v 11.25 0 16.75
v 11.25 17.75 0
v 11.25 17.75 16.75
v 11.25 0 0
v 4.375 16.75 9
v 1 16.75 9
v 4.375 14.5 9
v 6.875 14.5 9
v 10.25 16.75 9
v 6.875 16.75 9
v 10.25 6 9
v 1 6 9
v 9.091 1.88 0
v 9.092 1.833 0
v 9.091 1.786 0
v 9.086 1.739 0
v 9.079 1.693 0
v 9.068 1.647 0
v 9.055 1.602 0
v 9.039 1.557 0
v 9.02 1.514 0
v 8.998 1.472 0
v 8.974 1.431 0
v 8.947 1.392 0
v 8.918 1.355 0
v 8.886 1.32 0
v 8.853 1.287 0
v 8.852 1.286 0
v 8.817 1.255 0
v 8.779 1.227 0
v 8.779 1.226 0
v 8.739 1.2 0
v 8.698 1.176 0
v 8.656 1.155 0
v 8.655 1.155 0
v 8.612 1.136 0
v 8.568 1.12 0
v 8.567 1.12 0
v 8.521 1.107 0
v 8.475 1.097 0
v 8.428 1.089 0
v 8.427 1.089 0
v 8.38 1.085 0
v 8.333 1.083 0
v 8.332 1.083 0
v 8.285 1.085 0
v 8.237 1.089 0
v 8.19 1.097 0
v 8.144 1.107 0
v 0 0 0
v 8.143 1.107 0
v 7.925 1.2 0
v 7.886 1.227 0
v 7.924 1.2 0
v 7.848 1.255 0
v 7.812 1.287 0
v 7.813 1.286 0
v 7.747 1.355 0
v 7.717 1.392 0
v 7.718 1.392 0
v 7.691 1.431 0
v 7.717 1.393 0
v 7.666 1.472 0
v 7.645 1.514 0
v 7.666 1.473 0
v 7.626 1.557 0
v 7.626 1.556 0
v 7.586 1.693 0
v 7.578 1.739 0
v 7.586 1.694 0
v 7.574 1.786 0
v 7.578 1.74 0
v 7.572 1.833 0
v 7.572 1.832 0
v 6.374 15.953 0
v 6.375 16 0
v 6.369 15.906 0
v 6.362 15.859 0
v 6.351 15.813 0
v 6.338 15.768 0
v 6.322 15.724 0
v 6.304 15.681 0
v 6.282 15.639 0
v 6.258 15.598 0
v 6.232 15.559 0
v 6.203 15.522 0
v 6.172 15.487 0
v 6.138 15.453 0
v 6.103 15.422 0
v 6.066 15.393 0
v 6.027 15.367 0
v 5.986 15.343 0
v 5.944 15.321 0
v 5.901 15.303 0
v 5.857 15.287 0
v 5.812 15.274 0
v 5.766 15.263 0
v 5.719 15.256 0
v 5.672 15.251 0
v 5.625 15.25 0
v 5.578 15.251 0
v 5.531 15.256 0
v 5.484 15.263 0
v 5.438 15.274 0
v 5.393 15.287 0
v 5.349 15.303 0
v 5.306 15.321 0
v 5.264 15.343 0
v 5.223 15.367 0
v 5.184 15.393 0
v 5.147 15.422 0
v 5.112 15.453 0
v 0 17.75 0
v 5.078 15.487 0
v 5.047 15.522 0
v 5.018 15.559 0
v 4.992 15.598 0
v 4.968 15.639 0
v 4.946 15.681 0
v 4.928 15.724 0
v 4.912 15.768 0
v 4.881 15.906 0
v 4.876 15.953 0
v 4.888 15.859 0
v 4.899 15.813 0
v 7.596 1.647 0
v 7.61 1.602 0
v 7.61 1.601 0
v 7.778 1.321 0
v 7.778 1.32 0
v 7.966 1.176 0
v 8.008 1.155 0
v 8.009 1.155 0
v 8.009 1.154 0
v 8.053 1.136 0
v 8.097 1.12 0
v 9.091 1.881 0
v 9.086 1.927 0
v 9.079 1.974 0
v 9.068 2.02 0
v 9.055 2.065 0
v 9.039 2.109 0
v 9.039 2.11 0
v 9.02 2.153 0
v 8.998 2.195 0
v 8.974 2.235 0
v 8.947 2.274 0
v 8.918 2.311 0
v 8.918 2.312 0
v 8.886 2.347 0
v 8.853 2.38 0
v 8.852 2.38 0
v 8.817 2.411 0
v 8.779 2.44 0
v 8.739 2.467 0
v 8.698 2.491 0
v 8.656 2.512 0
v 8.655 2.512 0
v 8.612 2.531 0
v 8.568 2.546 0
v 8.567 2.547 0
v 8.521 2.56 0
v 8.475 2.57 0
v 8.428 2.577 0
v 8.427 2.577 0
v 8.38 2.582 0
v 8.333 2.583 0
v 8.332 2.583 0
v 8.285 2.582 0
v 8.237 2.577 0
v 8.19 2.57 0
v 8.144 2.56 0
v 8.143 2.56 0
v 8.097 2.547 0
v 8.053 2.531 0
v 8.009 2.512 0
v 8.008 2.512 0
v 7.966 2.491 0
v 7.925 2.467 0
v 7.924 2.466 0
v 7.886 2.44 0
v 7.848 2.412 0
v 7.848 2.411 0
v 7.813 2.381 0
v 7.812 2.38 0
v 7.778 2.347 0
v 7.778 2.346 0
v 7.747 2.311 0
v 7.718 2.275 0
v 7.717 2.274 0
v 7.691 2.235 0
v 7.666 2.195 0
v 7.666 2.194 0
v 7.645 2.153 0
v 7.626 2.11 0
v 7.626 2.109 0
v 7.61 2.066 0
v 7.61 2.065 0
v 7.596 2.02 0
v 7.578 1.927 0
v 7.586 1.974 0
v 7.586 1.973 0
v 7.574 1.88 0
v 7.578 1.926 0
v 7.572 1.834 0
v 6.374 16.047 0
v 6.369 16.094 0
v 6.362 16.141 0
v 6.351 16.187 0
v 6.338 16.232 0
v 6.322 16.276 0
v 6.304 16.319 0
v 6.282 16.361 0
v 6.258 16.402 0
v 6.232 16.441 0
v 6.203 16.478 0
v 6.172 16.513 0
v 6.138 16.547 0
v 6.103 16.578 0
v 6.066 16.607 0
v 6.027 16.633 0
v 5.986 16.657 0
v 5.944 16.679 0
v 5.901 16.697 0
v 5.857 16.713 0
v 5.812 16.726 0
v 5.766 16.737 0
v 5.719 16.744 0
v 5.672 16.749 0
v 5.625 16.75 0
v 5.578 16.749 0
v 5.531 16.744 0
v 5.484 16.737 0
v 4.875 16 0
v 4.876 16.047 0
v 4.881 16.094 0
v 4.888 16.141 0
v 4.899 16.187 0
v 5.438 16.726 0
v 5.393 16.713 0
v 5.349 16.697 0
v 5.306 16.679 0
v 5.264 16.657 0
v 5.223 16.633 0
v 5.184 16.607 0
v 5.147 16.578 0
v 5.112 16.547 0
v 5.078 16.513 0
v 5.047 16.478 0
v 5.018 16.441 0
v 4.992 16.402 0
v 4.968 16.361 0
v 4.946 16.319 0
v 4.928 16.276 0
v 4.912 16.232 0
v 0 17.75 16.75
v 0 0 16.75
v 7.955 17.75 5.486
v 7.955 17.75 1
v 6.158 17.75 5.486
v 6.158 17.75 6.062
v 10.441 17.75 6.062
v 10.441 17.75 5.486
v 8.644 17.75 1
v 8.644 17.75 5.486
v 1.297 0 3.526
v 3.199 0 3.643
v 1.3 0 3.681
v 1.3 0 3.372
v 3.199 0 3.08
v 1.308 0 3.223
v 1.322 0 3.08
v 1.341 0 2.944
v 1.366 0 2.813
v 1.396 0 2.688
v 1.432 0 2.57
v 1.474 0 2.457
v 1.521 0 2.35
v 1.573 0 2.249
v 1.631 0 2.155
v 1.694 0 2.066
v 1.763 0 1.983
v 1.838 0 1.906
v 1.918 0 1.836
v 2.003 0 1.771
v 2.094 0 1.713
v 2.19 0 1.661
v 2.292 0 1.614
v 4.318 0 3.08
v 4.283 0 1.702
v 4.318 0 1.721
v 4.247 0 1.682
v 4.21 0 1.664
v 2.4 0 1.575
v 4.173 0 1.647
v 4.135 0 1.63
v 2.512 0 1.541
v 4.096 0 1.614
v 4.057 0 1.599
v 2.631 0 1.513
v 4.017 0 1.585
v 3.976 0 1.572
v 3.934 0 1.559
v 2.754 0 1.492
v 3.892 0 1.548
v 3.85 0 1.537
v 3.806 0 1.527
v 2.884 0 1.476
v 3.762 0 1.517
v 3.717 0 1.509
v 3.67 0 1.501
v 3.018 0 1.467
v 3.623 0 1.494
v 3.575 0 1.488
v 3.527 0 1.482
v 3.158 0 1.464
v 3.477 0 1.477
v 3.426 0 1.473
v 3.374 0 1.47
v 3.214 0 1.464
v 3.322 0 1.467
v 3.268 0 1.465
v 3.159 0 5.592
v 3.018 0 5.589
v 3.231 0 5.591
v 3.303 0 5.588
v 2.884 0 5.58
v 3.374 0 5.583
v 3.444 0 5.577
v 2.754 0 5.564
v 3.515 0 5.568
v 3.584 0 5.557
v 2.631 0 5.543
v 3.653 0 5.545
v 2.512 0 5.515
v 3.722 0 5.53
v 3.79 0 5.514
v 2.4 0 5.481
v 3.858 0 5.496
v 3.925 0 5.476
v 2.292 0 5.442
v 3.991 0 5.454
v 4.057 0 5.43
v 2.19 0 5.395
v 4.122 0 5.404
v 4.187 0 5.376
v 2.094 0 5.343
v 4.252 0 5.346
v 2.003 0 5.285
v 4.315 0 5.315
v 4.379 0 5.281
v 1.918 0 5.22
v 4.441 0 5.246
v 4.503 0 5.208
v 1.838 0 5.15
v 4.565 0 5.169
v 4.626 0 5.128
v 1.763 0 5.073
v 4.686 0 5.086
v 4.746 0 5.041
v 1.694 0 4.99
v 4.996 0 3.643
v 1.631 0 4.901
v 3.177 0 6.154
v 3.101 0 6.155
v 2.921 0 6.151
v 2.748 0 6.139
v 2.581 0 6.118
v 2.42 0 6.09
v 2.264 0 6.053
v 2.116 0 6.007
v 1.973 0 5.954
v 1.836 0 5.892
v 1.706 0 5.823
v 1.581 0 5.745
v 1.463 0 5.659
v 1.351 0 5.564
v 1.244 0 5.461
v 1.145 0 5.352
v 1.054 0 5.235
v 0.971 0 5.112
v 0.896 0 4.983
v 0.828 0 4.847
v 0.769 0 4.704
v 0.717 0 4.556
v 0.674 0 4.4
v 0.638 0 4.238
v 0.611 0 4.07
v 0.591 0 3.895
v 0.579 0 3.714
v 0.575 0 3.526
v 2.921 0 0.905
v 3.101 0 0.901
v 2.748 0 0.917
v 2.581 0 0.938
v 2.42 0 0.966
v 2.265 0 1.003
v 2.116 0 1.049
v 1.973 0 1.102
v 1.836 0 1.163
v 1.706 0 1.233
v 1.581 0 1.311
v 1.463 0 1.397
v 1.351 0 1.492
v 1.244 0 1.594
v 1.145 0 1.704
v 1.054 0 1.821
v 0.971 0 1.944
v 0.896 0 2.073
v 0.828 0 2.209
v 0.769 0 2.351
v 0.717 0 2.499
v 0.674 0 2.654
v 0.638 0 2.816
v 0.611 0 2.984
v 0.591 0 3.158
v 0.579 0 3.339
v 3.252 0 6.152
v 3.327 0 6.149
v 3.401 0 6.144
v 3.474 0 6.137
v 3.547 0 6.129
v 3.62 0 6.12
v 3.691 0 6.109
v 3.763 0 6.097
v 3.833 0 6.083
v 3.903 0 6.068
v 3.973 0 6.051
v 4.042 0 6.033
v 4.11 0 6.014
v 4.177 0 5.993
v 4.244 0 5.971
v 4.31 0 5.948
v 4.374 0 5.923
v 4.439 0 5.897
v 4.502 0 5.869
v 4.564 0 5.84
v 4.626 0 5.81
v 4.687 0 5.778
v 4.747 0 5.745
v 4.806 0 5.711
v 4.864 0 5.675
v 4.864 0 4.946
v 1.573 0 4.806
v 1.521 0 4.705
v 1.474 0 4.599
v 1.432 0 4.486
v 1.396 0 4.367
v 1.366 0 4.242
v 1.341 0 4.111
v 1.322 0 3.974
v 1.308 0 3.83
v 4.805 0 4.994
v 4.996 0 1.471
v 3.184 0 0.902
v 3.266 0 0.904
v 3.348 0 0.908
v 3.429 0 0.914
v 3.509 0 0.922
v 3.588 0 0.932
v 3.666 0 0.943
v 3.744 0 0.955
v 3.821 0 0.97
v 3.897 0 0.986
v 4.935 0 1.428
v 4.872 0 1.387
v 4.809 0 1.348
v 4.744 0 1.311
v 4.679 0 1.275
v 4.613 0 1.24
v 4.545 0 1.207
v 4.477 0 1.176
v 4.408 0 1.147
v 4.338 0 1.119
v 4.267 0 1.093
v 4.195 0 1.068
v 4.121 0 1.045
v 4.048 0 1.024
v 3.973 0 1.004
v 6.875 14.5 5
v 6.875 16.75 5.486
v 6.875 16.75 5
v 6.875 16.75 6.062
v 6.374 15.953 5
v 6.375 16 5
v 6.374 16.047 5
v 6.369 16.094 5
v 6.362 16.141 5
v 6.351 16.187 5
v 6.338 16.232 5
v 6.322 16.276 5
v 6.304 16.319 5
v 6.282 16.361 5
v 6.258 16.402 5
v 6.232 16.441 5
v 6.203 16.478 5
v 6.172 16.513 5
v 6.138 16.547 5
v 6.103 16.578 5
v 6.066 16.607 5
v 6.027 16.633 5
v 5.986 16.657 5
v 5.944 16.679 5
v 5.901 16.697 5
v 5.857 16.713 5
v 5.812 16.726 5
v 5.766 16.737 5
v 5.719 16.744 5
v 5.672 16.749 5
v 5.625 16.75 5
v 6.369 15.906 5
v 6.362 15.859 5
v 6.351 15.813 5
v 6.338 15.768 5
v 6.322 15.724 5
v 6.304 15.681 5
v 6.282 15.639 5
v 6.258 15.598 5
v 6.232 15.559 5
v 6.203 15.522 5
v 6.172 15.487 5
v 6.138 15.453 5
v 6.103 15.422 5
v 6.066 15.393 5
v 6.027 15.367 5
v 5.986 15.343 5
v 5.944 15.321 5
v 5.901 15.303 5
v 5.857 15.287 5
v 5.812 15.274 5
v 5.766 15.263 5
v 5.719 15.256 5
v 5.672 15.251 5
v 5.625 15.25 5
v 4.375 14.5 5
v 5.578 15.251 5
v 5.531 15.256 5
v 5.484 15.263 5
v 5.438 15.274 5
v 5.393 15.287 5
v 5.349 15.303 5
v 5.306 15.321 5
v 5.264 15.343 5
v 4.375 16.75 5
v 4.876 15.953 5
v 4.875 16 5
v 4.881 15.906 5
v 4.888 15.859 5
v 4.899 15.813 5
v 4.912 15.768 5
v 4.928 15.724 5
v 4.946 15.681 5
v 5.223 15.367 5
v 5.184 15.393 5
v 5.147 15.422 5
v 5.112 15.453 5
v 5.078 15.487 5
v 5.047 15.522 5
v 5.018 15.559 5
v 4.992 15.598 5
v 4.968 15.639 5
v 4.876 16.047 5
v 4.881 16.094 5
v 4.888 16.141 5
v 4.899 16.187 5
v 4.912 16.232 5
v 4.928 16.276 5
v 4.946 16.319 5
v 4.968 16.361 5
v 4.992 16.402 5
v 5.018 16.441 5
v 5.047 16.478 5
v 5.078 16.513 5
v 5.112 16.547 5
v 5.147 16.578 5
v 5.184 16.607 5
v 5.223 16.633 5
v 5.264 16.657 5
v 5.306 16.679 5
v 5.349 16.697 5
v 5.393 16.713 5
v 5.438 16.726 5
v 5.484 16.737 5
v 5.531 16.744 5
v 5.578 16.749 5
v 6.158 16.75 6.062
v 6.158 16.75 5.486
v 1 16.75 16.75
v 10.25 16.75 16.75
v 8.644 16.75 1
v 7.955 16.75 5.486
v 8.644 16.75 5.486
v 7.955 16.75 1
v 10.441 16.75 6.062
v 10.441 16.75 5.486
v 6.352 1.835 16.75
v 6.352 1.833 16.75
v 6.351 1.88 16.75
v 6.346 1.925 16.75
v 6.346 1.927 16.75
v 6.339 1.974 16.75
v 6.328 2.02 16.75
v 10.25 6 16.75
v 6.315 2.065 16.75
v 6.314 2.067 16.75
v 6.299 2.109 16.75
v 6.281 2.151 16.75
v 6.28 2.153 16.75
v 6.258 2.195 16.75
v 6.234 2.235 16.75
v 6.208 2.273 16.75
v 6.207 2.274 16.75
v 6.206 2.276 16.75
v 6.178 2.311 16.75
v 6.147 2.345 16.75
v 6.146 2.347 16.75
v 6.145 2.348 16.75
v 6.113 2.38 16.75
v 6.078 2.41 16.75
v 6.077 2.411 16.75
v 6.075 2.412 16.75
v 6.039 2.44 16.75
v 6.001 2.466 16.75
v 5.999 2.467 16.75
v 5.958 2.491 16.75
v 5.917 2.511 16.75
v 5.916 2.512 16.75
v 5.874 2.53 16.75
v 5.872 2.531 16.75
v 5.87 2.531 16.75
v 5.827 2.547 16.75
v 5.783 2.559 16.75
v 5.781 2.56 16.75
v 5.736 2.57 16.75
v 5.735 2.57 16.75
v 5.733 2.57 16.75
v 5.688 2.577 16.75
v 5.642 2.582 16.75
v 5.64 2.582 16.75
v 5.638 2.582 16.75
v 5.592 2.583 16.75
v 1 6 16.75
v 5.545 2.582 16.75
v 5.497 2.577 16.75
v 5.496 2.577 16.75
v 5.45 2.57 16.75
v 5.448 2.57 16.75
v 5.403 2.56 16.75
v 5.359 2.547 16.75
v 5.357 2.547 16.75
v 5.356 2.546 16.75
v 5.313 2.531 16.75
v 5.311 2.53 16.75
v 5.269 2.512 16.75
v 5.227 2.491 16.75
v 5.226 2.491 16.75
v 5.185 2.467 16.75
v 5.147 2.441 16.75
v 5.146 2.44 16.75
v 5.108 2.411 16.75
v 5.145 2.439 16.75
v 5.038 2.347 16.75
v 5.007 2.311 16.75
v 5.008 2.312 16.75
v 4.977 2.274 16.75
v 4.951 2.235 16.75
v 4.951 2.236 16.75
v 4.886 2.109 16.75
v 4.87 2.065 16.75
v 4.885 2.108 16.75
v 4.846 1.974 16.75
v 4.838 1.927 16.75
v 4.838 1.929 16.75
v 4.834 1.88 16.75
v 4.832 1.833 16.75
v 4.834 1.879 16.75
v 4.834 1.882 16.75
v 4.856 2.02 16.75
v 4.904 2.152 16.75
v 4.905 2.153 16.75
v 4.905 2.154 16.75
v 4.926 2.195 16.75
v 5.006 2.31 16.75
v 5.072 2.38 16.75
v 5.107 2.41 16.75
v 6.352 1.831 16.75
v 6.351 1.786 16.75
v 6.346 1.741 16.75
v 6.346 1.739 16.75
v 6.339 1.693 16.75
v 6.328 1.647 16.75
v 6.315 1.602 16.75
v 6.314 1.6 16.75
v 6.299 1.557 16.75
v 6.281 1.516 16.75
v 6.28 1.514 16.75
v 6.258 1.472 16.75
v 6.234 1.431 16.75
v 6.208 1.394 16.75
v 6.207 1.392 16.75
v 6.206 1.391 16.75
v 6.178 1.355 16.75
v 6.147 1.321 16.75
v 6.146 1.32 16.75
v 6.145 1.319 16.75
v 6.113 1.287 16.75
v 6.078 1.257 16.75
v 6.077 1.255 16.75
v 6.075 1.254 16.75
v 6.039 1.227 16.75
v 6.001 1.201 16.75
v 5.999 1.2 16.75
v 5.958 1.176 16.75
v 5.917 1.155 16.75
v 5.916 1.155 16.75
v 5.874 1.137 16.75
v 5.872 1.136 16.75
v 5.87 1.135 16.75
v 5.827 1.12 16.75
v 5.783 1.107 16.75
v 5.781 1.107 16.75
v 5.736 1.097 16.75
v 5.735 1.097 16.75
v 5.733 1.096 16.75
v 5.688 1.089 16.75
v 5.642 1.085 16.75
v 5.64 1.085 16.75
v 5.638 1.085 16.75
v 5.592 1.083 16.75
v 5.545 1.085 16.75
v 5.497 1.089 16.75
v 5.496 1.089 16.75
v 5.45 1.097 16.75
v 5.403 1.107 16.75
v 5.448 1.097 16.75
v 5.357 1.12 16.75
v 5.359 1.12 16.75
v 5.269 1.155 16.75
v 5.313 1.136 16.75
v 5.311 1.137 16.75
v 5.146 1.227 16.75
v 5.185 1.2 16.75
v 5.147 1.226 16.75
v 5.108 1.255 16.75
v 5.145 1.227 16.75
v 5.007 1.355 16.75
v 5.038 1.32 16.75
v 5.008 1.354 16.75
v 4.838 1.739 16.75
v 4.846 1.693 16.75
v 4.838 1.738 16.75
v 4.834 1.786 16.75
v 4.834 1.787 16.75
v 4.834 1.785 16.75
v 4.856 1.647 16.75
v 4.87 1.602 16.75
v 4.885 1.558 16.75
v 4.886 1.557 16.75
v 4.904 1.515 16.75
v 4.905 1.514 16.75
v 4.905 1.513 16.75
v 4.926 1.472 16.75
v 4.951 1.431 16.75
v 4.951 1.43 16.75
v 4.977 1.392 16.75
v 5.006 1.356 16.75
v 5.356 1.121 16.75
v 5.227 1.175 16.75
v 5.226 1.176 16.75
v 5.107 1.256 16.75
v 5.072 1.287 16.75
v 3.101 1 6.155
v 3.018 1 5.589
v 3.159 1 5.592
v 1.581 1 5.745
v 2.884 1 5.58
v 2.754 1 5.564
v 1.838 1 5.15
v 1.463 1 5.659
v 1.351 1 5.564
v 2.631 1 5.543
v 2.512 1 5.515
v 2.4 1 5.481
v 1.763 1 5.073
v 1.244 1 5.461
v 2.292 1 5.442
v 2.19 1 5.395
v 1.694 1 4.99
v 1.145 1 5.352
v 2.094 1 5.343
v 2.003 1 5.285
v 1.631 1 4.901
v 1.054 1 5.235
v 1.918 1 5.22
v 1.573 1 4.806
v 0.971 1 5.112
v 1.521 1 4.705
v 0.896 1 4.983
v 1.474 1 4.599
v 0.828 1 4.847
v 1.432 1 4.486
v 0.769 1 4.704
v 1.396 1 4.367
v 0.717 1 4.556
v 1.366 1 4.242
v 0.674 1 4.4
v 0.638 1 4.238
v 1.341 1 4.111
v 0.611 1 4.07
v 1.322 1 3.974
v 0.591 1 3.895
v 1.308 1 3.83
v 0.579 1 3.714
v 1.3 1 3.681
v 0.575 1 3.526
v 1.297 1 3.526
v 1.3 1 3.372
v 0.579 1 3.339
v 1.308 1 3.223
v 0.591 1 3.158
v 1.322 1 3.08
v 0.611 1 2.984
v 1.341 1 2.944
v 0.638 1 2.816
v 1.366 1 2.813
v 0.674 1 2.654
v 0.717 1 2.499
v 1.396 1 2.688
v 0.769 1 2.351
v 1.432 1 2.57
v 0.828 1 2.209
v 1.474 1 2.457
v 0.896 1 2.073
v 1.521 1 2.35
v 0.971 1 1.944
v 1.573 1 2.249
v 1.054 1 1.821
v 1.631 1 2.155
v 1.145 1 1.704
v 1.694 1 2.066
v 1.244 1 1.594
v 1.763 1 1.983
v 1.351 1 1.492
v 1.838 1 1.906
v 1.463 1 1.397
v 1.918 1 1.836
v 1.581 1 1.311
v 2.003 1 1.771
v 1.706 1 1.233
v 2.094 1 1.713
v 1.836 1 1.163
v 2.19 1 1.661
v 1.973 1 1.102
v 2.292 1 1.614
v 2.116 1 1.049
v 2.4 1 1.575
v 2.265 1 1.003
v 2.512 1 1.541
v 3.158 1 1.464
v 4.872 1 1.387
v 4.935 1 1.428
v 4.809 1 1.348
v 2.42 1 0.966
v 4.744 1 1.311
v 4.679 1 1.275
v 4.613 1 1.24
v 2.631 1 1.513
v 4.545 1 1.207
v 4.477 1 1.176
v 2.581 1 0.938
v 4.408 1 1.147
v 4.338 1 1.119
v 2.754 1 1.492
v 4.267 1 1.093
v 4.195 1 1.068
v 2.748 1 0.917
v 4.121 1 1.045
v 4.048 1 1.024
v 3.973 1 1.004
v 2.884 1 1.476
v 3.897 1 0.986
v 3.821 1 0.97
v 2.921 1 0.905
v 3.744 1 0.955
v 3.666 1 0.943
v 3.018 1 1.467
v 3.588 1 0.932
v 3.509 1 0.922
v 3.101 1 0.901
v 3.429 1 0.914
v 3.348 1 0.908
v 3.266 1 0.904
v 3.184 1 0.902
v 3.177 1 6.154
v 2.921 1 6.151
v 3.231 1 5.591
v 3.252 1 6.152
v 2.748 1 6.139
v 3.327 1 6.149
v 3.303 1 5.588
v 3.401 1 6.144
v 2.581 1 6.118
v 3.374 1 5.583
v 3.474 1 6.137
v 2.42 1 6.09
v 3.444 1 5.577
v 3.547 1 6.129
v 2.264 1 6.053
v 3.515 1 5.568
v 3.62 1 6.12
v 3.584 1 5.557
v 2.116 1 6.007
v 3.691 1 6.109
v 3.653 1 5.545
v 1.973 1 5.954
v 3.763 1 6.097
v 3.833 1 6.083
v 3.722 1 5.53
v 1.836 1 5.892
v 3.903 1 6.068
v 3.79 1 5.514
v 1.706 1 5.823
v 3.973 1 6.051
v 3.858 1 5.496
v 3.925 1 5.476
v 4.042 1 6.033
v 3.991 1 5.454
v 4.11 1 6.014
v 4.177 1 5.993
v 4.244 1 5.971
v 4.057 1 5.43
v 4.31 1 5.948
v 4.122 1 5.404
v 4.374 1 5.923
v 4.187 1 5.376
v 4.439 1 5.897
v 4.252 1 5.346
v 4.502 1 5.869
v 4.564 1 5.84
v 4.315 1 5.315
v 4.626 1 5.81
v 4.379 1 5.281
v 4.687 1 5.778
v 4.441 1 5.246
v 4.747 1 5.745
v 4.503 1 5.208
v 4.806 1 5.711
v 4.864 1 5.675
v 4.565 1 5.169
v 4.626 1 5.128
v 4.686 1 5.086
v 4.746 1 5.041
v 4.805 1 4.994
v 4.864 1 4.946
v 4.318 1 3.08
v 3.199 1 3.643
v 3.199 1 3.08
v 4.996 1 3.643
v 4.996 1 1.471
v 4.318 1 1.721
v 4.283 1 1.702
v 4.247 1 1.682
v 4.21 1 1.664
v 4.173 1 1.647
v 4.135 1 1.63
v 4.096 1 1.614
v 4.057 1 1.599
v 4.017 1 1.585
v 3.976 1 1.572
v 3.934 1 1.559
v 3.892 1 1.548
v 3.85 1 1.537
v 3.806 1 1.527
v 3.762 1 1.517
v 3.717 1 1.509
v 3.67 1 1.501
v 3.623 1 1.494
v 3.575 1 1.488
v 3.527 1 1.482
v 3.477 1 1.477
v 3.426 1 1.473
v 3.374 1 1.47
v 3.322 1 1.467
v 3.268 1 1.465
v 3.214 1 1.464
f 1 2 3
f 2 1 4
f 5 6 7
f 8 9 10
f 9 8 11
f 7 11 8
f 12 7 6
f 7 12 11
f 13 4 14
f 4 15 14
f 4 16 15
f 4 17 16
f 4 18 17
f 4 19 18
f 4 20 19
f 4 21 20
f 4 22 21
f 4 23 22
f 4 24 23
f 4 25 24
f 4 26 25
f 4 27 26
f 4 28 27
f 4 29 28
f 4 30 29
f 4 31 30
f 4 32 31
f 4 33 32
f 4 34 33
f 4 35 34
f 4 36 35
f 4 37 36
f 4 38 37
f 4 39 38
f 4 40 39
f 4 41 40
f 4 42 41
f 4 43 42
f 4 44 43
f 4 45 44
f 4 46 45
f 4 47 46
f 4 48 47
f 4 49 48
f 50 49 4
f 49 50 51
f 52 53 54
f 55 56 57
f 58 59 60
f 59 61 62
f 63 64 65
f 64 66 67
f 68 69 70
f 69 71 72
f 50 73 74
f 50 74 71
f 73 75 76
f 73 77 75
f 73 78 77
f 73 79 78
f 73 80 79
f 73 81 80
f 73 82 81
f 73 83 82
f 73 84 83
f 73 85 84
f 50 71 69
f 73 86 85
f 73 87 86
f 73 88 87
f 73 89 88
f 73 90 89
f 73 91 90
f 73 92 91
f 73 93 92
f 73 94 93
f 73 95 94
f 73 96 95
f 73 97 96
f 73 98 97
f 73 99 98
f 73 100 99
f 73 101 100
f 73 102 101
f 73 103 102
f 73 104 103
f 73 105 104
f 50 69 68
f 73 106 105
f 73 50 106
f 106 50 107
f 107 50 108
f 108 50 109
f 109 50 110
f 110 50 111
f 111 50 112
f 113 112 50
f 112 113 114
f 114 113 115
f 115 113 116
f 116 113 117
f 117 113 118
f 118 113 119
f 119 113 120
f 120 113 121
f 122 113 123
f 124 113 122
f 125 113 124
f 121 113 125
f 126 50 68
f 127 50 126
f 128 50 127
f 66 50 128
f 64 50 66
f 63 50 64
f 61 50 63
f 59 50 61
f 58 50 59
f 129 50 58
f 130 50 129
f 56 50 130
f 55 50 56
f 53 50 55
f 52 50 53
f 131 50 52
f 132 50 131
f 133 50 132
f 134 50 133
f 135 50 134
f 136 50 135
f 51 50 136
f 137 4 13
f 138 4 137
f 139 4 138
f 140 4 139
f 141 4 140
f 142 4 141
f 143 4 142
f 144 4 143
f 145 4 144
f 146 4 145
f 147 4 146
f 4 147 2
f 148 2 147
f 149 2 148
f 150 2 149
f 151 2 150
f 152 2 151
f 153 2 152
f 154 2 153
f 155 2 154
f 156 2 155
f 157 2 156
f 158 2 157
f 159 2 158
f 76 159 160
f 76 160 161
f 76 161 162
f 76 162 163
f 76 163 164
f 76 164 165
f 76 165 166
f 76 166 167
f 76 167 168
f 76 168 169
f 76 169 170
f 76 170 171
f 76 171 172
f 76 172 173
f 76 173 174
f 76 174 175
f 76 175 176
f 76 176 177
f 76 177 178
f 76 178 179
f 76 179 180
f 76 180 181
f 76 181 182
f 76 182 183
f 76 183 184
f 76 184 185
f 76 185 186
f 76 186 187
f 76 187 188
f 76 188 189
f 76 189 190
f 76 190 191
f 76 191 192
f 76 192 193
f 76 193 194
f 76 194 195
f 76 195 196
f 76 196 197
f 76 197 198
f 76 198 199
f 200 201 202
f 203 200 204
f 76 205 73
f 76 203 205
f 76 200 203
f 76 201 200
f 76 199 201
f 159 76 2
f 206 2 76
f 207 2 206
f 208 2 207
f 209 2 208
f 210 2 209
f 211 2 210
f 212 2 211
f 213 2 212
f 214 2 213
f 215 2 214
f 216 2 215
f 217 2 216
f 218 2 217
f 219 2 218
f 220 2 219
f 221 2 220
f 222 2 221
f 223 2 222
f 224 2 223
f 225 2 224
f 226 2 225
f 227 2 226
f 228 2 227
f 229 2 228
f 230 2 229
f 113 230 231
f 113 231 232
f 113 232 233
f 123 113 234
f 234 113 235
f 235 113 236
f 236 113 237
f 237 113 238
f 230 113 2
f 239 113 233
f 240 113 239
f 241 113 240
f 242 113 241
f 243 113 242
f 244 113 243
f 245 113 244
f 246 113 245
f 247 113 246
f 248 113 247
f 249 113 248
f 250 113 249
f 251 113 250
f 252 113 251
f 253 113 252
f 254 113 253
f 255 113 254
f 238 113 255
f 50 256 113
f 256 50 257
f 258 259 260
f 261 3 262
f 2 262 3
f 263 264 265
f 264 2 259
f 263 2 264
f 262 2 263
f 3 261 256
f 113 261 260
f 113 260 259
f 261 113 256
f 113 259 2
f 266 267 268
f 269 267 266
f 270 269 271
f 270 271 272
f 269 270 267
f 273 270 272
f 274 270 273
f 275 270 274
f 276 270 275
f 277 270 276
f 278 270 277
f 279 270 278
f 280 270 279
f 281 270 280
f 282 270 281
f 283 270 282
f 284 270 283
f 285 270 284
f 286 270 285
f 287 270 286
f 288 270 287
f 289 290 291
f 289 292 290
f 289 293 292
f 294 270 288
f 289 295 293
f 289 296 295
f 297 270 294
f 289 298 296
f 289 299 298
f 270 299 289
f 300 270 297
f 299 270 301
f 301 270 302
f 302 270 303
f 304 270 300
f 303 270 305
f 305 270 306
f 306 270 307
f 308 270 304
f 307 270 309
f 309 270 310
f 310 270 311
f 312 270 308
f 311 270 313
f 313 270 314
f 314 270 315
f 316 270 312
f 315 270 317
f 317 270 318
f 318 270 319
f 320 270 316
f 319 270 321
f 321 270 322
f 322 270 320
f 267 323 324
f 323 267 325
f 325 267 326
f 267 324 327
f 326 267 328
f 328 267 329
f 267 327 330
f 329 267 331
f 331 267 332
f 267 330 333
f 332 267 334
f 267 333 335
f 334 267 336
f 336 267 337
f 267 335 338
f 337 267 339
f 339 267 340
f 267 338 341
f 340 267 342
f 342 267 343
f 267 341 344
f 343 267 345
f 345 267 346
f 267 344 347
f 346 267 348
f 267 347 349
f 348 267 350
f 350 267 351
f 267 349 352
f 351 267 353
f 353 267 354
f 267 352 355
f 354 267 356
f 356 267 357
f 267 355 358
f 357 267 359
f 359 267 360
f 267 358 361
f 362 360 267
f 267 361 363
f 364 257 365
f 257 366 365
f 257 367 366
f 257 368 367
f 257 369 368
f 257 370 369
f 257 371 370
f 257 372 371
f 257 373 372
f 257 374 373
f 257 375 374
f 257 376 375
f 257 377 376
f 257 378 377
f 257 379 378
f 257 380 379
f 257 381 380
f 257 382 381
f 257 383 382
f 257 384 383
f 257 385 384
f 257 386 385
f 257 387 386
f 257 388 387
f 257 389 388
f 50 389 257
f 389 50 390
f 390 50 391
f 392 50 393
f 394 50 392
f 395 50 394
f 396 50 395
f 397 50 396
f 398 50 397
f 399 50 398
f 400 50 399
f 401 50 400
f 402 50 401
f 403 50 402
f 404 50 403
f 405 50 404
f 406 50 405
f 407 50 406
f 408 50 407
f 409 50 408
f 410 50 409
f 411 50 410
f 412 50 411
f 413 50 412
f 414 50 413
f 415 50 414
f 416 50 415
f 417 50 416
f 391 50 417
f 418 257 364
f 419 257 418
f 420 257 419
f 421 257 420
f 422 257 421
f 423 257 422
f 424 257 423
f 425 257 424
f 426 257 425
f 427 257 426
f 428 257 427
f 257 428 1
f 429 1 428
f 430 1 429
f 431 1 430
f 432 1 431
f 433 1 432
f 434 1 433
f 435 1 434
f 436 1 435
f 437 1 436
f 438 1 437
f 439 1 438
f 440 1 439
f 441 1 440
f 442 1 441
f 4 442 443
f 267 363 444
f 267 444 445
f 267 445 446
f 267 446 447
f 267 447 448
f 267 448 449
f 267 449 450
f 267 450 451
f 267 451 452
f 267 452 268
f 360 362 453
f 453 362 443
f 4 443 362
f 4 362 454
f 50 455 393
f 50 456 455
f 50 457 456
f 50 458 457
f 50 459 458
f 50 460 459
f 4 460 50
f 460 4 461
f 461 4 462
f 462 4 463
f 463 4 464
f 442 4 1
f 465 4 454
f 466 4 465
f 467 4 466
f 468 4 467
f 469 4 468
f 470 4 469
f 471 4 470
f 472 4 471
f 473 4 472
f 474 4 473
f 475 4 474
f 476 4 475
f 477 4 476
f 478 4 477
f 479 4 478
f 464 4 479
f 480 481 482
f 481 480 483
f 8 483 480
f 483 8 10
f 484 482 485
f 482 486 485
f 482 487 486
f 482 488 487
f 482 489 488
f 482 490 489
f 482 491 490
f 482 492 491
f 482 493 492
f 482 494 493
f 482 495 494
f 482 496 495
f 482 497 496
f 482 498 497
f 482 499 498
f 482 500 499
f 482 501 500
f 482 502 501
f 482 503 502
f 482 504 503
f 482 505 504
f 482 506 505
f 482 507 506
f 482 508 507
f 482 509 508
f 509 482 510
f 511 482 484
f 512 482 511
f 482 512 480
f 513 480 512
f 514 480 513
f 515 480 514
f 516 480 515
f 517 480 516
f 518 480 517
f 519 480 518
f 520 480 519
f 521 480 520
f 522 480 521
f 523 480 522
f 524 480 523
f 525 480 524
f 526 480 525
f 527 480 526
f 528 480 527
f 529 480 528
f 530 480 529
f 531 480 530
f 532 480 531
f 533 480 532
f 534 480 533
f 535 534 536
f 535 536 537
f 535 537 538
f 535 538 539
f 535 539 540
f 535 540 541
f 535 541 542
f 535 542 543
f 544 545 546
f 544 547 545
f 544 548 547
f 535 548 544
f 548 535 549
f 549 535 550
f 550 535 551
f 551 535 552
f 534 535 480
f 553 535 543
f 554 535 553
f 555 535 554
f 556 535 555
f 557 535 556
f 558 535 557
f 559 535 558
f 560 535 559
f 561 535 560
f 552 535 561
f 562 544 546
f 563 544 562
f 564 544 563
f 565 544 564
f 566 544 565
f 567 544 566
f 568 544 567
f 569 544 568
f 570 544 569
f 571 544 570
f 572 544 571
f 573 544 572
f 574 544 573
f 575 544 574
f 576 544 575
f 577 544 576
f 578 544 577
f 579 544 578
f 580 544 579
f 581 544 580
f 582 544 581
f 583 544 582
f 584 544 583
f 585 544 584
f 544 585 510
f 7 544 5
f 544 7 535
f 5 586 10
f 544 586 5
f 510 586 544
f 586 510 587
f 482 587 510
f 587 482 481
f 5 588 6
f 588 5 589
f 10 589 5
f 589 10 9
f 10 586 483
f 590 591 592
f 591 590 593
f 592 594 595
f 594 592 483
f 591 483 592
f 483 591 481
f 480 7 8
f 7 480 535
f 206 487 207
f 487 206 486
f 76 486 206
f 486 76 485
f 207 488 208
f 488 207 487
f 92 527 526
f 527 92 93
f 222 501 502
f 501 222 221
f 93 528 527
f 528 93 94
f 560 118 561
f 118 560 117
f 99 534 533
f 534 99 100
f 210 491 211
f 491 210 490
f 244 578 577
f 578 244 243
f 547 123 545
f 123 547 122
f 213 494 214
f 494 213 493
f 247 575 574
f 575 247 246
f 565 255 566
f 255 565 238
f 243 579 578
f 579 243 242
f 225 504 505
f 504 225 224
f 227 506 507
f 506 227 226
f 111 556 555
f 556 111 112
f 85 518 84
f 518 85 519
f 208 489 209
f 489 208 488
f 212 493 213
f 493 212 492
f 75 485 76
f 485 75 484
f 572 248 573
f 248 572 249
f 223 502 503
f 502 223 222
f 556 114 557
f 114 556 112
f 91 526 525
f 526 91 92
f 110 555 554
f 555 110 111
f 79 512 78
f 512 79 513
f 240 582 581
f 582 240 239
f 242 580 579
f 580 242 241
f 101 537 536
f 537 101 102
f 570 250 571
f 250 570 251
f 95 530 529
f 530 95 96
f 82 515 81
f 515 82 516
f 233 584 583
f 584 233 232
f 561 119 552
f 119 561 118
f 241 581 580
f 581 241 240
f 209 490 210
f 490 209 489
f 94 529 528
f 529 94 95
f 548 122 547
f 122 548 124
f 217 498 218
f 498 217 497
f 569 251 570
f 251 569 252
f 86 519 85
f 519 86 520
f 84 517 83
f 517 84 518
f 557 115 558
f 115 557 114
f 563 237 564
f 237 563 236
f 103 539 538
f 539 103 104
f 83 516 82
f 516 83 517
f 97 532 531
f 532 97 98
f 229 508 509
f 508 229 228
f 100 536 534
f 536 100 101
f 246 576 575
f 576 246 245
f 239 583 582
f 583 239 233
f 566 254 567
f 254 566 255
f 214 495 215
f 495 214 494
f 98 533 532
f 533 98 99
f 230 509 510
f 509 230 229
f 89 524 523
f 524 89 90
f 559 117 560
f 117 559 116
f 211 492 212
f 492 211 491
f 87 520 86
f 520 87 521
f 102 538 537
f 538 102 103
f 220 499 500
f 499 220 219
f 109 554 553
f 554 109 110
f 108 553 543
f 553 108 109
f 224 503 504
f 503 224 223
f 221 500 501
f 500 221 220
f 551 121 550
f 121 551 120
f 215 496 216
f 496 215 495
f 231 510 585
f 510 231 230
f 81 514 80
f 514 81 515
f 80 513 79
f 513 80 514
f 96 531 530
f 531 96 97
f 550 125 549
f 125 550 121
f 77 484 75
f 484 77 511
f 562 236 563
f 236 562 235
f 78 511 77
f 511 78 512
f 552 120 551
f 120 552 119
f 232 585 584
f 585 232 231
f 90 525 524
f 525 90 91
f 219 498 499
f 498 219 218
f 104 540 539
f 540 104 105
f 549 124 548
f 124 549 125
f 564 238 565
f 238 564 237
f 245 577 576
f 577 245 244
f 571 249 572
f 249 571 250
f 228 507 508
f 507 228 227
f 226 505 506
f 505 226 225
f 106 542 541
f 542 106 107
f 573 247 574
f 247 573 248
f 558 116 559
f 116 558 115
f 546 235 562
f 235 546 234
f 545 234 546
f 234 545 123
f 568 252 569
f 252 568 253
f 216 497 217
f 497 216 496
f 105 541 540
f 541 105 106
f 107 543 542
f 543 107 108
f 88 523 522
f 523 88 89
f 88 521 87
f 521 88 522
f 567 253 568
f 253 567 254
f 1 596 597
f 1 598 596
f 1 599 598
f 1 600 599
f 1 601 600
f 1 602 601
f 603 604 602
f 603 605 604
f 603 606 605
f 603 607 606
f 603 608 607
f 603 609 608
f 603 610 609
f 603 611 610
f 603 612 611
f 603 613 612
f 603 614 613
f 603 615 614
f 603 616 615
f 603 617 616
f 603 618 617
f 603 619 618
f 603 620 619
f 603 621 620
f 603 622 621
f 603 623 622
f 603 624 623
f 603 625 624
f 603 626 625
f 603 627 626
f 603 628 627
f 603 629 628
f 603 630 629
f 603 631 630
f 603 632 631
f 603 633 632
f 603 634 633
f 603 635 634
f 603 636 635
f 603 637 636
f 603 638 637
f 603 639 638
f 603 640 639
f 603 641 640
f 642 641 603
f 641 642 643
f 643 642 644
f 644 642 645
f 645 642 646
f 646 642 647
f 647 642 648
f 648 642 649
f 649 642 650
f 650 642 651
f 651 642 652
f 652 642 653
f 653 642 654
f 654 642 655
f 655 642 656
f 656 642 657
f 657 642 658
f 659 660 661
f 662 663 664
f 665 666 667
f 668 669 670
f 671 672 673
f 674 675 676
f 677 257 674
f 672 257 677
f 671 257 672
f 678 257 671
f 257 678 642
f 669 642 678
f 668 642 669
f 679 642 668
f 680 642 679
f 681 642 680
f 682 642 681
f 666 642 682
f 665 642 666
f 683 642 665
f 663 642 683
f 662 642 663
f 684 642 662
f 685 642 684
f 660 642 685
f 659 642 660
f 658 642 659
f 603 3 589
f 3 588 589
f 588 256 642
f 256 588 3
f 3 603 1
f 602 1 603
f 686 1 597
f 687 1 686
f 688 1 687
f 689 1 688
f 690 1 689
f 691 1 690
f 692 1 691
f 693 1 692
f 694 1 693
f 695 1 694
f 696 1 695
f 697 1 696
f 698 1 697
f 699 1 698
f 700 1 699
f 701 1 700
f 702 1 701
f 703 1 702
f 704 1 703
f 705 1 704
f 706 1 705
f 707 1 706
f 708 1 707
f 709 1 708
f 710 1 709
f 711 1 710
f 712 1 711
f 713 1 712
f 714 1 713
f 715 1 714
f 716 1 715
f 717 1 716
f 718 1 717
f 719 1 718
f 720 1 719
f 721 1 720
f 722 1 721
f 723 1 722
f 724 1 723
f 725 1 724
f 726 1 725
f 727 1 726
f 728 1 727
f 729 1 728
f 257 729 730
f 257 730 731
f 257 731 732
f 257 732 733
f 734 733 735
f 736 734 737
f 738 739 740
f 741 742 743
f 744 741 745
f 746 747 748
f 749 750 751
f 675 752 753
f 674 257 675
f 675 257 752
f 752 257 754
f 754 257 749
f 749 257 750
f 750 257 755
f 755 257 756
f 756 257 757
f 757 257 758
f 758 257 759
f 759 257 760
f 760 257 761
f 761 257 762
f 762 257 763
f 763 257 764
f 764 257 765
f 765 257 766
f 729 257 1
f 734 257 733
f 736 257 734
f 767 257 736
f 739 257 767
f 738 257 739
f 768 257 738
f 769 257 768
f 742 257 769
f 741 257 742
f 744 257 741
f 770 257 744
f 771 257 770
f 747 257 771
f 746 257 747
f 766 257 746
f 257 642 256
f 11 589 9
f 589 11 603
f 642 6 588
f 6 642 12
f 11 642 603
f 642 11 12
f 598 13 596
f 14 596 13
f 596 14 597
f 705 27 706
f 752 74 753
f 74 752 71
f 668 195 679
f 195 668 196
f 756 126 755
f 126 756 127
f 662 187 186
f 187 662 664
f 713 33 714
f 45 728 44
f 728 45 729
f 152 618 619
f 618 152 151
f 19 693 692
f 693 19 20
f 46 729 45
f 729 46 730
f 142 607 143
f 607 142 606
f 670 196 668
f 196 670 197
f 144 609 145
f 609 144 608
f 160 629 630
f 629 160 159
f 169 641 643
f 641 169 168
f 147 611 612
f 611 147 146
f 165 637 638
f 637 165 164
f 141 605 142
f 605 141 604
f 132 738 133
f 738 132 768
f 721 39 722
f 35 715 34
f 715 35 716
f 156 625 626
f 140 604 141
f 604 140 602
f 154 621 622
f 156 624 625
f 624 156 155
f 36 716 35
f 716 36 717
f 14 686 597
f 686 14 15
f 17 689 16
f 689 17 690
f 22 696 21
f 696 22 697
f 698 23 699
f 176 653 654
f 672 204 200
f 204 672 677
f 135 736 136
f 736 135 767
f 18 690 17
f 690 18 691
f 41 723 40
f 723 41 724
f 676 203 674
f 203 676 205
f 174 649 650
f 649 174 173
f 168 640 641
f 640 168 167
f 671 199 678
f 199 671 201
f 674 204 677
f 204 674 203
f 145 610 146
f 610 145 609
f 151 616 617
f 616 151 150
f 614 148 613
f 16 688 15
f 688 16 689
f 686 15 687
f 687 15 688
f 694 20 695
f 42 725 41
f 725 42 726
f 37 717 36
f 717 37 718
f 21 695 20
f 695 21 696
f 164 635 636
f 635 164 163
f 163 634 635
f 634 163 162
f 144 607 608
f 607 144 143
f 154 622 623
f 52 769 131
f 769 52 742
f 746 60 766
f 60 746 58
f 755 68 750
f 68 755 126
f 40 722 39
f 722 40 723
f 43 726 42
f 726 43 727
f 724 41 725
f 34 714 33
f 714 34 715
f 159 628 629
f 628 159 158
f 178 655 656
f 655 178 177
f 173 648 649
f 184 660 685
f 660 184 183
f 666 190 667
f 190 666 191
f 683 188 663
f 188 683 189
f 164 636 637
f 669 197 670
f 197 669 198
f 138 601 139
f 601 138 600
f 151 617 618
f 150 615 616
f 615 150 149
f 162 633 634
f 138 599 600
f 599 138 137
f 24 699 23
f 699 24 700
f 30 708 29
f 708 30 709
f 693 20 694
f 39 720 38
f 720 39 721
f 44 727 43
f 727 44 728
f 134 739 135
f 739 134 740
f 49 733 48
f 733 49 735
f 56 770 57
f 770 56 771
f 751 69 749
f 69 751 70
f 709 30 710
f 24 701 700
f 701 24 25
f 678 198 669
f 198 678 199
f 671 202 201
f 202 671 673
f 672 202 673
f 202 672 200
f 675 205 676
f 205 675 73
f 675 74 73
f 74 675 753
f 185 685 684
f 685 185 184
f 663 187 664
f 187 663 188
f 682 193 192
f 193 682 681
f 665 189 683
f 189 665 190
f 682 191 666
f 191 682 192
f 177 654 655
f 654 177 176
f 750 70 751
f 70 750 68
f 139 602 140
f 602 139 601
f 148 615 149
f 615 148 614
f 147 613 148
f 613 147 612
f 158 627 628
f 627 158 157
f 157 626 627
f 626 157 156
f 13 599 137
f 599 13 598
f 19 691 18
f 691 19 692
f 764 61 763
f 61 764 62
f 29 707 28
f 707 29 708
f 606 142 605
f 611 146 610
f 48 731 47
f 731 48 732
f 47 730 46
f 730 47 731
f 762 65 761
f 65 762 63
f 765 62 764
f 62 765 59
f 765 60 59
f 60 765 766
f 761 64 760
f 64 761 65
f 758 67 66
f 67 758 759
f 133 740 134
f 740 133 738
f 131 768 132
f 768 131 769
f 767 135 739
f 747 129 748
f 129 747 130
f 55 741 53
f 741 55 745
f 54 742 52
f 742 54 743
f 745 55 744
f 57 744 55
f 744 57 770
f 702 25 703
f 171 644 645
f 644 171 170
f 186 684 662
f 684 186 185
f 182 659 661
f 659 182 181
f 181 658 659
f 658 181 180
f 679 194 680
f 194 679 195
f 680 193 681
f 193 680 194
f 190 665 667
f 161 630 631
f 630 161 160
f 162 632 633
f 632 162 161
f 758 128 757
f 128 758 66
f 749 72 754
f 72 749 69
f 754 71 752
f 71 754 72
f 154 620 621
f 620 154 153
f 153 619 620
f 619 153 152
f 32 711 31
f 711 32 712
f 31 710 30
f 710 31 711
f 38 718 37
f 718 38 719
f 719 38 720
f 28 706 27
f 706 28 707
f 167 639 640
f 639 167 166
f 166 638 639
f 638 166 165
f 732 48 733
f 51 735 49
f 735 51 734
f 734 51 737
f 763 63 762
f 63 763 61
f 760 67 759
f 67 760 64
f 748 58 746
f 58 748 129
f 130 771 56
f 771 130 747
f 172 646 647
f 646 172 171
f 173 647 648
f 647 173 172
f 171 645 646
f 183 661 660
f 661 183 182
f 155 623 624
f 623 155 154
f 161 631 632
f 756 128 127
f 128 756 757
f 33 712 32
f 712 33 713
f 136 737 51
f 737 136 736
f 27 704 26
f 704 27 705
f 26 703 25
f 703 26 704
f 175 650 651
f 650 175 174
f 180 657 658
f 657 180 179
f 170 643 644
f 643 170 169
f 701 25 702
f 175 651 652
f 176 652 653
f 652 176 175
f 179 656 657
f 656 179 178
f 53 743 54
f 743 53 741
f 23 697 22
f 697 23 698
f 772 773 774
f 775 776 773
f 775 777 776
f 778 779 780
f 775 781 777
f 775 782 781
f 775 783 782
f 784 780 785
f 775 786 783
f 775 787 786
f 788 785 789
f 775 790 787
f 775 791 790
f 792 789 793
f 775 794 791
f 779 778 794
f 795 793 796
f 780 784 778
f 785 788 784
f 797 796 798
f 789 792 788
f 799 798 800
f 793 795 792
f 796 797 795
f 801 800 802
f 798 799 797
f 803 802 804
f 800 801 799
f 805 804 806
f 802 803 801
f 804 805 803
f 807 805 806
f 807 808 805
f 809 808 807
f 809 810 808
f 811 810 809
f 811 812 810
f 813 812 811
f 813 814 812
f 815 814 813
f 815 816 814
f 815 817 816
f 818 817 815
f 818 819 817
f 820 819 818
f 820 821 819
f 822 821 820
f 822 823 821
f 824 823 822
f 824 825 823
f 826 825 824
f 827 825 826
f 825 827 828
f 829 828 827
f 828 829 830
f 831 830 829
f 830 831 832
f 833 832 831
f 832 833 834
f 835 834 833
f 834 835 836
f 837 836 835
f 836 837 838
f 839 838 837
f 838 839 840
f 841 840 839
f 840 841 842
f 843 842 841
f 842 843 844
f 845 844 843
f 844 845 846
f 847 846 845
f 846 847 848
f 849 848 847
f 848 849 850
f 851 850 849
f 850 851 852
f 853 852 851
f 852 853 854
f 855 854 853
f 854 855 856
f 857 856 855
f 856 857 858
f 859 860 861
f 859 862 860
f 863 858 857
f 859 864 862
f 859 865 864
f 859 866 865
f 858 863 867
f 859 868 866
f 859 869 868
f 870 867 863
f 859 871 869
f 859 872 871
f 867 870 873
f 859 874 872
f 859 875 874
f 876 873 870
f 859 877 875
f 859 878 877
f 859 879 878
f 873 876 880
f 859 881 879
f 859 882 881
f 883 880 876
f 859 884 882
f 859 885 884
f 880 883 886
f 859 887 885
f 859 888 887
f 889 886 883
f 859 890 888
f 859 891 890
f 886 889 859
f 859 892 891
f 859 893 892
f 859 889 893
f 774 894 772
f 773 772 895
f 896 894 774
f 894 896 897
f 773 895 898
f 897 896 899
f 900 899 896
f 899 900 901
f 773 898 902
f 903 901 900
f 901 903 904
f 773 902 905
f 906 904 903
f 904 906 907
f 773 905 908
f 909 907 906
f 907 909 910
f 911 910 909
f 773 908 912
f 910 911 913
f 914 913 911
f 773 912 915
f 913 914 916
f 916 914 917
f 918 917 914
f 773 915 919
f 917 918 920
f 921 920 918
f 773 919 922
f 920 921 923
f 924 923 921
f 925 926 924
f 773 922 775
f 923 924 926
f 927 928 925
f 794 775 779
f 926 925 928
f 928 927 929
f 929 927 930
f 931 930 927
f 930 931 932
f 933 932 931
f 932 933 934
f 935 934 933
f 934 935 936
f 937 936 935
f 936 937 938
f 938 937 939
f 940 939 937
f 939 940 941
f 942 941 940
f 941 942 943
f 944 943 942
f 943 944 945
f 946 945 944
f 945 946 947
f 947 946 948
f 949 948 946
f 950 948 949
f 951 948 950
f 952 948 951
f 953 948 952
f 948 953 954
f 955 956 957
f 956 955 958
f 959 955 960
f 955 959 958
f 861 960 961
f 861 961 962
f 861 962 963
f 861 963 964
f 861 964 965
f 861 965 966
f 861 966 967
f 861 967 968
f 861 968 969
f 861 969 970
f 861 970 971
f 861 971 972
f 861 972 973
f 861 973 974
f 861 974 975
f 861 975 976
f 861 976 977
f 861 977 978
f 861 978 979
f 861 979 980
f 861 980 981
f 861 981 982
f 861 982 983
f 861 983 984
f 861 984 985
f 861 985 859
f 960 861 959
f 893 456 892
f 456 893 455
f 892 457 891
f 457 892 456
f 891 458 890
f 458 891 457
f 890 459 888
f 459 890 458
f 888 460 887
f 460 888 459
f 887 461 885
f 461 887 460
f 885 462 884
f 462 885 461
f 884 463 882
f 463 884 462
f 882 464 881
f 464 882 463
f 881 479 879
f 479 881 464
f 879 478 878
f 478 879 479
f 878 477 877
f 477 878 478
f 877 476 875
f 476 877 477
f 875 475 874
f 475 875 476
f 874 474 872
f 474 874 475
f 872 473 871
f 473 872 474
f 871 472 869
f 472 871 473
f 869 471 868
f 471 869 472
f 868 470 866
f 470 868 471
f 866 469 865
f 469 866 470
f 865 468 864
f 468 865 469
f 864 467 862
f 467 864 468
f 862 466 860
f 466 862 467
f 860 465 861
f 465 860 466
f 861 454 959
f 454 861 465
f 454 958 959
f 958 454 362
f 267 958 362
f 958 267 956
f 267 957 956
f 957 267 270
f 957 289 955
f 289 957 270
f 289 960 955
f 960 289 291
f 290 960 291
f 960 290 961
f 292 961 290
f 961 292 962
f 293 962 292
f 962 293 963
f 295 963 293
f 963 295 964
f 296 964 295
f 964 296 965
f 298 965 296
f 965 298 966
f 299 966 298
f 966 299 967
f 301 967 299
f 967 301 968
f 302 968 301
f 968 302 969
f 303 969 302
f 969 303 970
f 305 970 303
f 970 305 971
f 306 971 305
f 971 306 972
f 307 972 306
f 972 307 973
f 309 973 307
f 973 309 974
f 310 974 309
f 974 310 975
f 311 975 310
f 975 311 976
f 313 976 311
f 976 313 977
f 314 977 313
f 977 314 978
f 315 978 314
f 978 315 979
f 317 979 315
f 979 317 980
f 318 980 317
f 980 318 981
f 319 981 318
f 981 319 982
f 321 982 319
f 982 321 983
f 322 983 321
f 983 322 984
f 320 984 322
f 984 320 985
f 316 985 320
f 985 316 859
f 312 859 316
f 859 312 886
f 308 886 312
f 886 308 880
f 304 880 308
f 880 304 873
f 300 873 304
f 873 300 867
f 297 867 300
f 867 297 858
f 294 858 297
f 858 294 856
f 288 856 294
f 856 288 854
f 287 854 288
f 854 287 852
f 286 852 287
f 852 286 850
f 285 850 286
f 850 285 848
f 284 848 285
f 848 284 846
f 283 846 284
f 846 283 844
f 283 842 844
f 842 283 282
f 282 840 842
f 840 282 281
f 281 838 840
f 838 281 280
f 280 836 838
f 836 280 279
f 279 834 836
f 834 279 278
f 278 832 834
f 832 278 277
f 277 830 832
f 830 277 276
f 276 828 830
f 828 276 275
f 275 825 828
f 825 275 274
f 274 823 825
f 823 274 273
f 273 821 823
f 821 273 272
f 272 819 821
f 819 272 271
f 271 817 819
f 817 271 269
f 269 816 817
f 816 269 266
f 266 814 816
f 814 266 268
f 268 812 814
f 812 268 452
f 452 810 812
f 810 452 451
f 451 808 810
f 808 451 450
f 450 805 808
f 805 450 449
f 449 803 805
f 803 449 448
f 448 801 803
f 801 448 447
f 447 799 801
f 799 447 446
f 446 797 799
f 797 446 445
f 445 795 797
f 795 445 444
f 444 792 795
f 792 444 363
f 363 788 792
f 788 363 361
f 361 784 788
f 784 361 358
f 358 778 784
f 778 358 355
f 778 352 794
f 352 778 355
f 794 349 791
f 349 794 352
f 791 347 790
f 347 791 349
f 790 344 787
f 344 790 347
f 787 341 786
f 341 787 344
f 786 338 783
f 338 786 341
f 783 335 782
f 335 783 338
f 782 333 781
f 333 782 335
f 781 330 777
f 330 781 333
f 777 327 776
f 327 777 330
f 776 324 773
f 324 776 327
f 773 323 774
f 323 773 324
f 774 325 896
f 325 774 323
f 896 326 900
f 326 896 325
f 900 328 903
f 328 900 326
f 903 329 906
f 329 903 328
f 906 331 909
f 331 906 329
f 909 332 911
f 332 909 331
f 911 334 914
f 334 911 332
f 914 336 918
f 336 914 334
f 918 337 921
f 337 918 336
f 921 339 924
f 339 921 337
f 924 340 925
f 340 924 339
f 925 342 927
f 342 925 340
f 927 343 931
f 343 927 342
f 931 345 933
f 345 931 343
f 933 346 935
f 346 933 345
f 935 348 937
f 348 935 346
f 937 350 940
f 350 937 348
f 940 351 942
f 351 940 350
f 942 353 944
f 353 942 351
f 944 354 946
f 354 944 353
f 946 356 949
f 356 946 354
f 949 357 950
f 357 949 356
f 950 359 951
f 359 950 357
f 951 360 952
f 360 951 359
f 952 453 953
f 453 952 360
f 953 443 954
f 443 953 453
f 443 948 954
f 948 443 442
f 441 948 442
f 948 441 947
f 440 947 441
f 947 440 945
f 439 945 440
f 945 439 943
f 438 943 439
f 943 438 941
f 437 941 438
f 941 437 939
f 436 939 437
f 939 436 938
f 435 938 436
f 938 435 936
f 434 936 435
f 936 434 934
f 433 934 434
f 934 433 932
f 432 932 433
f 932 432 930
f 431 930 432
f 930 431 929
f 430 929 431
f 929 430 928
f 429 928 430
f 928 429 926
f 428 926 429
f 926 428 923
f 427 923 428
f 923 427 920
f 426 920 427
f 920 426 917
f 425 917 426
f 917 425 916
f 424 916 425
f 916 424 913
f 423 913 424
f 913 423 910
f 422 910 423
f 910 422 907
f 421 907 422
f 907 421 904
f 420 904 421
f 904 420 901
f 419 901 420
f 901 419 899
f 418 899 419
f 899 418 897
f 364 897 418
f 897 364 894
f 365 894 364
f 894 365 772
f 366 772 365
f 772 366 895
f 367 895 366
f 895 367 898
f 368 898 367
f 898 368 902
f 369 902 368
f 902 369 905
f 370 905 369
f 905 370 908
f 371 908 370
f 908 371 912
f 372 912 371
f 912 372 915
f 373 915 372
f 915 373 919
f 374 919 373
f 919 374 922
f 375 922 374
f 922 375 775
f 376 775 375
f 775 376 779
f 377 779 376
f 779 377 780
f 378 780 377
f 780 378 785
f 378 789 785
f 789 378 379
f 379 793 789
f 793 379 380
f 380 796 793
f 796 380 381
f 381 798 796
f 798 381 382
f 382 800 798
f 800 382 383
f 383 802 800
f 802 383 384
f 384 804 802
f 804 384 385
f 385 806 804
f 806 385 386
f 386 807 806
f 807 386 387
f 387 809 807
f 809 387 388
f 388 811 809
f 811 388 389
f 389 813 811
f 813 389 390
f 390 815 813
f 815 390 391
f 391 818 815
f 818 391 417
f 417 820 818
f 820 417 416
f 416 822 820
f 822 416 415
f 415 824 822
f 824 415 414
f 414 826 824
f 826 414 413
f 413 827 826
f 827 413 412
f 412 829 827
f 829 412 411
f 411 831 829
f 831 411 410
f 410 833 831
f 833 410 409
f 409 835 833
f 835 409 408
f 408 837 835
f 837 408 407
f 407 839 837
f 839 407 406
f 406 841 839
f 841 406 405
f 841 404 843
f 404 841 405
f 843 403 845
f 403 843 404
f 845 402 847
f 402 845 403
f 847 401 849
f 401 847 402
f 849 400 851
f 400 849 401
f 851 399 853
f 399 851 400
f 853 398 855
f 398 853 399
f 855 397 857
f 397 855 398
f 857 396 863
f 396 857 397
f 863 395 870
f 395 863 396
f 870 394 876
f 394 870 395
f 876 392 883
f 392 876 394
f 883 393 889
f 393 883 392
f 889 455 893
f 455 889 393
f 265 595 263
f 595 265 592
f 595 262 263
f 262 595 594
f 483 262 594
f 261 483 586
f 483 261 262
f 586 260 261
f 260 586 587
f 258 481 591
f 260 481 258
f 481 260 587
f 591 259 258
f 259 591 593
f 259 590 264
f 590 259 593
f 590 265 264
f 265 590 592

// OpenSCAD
// Socket for the 3.5mm jack, err, socket - RS part #106-874.
// Allows one to solder pins and then your board-mount socket is ready
// to be used on a breadboard.
//
// I print without support for the letters to appear nicely.

{ // Part dimensions
  connector_width = 2.5;
  connector_height = 5;
  connector_thickness = 1;
  pin_hole_diameter = 1.5;
  
  size_x = 9.25;
  // 0.25 is an adjustment that I've found necessary for the part to
  // slip in and enjoy a snug fit... Maybe it's just my printer.
  size1_y = 10.5 + 0.25;
  size2_y = size1_y + connector_height;
  size1_z = 7.75;
  size2_z = connector_height;
  size3_z = 4;  // pin height

  // Wall thickness
  thickness = 1;

  $fn = 100;
}

module base() {
  max_y = size2_y+2*thickness;
  max_x = size_x+2*thickness;
  difference() {
    cube([max_x, max_y, size3_z + size2_z]);
    // vertical well for the back connector, in two parts:
    //   - The first part is wider so that the connector and its
    //     soldered pin can be inserted
    //   - The second part is just a circular well for the wire to
    //     go through
    solder_blob = 2.25;
    translate([max_x/2 - connector_width/2,
               max_y - thickness - solder_blob, size2_z]) {
      cube([connector_width, solder_blob, size3_z]);
    }
    translate([max_x/2,
               max_y - thickness - pin_hole_diameter/2]) {
      cylinder(d=pin_hole_diameter, h=size3_z+1);	        
    }
  }
}

module top() {
  difference() {
    cube([size_x+2*thickness, size2_y+2*thickness, size1_z]);
    translate([thickness, thickness + connector_height, 0]) {
      cube([size_x, size1_y, size1_z]);
    }
  }
}

module main_volume() {
  base();
  translate([0, 0, size3_z + size2_z]) {
    top();
  }
}

module front_pin_hole() {
  // Insert a rod that starts at the middle of the top module and
  // deviates right in such a what that at the bottom it exits at
  // 1/10th of an inch. We help get the right angle during print by
  // adding 0.2
  opposite = 2.54 + 0.2;
  adjacent = size1_z + size2_z + size3_z;
  echo(adjacent);
  angle = atan(opposite / adjacent);
  translate([opposite, 0, -0.2]) {
    rotate([0, -angle, 0]) {
      cylinder(d=pin_hole_diameter, h=adjacent+1);
    }
  }
}

module part() {
  front_pin_hole_x = (size_x+2*thickness)/2;
  front_pin_hole_y = thickness + connector_width/3;
  difference() {
    main_volume();
    translate([front_pin_hole_x, front_pin_hole_y, 0]) {
      front_pin_hole();	     
    }
    translate([front_pin_hole_x/2, 1, 1]) {
      rotate([90, 0, 0]) {
        linear_extrude(height=3, convexity=5) {
          text("G", size=5, halign="center", font="Impact");
        }
      }
    }
    translate([size_x-thickness, size2_y+4, 1]) {
      rotate([90, 0, 0]) {
        linear_extrude(height=3, convexity=5) {
          text("T", size=5, halign="center", font="Impact");
        }
      }
    }
  }
}

part();
